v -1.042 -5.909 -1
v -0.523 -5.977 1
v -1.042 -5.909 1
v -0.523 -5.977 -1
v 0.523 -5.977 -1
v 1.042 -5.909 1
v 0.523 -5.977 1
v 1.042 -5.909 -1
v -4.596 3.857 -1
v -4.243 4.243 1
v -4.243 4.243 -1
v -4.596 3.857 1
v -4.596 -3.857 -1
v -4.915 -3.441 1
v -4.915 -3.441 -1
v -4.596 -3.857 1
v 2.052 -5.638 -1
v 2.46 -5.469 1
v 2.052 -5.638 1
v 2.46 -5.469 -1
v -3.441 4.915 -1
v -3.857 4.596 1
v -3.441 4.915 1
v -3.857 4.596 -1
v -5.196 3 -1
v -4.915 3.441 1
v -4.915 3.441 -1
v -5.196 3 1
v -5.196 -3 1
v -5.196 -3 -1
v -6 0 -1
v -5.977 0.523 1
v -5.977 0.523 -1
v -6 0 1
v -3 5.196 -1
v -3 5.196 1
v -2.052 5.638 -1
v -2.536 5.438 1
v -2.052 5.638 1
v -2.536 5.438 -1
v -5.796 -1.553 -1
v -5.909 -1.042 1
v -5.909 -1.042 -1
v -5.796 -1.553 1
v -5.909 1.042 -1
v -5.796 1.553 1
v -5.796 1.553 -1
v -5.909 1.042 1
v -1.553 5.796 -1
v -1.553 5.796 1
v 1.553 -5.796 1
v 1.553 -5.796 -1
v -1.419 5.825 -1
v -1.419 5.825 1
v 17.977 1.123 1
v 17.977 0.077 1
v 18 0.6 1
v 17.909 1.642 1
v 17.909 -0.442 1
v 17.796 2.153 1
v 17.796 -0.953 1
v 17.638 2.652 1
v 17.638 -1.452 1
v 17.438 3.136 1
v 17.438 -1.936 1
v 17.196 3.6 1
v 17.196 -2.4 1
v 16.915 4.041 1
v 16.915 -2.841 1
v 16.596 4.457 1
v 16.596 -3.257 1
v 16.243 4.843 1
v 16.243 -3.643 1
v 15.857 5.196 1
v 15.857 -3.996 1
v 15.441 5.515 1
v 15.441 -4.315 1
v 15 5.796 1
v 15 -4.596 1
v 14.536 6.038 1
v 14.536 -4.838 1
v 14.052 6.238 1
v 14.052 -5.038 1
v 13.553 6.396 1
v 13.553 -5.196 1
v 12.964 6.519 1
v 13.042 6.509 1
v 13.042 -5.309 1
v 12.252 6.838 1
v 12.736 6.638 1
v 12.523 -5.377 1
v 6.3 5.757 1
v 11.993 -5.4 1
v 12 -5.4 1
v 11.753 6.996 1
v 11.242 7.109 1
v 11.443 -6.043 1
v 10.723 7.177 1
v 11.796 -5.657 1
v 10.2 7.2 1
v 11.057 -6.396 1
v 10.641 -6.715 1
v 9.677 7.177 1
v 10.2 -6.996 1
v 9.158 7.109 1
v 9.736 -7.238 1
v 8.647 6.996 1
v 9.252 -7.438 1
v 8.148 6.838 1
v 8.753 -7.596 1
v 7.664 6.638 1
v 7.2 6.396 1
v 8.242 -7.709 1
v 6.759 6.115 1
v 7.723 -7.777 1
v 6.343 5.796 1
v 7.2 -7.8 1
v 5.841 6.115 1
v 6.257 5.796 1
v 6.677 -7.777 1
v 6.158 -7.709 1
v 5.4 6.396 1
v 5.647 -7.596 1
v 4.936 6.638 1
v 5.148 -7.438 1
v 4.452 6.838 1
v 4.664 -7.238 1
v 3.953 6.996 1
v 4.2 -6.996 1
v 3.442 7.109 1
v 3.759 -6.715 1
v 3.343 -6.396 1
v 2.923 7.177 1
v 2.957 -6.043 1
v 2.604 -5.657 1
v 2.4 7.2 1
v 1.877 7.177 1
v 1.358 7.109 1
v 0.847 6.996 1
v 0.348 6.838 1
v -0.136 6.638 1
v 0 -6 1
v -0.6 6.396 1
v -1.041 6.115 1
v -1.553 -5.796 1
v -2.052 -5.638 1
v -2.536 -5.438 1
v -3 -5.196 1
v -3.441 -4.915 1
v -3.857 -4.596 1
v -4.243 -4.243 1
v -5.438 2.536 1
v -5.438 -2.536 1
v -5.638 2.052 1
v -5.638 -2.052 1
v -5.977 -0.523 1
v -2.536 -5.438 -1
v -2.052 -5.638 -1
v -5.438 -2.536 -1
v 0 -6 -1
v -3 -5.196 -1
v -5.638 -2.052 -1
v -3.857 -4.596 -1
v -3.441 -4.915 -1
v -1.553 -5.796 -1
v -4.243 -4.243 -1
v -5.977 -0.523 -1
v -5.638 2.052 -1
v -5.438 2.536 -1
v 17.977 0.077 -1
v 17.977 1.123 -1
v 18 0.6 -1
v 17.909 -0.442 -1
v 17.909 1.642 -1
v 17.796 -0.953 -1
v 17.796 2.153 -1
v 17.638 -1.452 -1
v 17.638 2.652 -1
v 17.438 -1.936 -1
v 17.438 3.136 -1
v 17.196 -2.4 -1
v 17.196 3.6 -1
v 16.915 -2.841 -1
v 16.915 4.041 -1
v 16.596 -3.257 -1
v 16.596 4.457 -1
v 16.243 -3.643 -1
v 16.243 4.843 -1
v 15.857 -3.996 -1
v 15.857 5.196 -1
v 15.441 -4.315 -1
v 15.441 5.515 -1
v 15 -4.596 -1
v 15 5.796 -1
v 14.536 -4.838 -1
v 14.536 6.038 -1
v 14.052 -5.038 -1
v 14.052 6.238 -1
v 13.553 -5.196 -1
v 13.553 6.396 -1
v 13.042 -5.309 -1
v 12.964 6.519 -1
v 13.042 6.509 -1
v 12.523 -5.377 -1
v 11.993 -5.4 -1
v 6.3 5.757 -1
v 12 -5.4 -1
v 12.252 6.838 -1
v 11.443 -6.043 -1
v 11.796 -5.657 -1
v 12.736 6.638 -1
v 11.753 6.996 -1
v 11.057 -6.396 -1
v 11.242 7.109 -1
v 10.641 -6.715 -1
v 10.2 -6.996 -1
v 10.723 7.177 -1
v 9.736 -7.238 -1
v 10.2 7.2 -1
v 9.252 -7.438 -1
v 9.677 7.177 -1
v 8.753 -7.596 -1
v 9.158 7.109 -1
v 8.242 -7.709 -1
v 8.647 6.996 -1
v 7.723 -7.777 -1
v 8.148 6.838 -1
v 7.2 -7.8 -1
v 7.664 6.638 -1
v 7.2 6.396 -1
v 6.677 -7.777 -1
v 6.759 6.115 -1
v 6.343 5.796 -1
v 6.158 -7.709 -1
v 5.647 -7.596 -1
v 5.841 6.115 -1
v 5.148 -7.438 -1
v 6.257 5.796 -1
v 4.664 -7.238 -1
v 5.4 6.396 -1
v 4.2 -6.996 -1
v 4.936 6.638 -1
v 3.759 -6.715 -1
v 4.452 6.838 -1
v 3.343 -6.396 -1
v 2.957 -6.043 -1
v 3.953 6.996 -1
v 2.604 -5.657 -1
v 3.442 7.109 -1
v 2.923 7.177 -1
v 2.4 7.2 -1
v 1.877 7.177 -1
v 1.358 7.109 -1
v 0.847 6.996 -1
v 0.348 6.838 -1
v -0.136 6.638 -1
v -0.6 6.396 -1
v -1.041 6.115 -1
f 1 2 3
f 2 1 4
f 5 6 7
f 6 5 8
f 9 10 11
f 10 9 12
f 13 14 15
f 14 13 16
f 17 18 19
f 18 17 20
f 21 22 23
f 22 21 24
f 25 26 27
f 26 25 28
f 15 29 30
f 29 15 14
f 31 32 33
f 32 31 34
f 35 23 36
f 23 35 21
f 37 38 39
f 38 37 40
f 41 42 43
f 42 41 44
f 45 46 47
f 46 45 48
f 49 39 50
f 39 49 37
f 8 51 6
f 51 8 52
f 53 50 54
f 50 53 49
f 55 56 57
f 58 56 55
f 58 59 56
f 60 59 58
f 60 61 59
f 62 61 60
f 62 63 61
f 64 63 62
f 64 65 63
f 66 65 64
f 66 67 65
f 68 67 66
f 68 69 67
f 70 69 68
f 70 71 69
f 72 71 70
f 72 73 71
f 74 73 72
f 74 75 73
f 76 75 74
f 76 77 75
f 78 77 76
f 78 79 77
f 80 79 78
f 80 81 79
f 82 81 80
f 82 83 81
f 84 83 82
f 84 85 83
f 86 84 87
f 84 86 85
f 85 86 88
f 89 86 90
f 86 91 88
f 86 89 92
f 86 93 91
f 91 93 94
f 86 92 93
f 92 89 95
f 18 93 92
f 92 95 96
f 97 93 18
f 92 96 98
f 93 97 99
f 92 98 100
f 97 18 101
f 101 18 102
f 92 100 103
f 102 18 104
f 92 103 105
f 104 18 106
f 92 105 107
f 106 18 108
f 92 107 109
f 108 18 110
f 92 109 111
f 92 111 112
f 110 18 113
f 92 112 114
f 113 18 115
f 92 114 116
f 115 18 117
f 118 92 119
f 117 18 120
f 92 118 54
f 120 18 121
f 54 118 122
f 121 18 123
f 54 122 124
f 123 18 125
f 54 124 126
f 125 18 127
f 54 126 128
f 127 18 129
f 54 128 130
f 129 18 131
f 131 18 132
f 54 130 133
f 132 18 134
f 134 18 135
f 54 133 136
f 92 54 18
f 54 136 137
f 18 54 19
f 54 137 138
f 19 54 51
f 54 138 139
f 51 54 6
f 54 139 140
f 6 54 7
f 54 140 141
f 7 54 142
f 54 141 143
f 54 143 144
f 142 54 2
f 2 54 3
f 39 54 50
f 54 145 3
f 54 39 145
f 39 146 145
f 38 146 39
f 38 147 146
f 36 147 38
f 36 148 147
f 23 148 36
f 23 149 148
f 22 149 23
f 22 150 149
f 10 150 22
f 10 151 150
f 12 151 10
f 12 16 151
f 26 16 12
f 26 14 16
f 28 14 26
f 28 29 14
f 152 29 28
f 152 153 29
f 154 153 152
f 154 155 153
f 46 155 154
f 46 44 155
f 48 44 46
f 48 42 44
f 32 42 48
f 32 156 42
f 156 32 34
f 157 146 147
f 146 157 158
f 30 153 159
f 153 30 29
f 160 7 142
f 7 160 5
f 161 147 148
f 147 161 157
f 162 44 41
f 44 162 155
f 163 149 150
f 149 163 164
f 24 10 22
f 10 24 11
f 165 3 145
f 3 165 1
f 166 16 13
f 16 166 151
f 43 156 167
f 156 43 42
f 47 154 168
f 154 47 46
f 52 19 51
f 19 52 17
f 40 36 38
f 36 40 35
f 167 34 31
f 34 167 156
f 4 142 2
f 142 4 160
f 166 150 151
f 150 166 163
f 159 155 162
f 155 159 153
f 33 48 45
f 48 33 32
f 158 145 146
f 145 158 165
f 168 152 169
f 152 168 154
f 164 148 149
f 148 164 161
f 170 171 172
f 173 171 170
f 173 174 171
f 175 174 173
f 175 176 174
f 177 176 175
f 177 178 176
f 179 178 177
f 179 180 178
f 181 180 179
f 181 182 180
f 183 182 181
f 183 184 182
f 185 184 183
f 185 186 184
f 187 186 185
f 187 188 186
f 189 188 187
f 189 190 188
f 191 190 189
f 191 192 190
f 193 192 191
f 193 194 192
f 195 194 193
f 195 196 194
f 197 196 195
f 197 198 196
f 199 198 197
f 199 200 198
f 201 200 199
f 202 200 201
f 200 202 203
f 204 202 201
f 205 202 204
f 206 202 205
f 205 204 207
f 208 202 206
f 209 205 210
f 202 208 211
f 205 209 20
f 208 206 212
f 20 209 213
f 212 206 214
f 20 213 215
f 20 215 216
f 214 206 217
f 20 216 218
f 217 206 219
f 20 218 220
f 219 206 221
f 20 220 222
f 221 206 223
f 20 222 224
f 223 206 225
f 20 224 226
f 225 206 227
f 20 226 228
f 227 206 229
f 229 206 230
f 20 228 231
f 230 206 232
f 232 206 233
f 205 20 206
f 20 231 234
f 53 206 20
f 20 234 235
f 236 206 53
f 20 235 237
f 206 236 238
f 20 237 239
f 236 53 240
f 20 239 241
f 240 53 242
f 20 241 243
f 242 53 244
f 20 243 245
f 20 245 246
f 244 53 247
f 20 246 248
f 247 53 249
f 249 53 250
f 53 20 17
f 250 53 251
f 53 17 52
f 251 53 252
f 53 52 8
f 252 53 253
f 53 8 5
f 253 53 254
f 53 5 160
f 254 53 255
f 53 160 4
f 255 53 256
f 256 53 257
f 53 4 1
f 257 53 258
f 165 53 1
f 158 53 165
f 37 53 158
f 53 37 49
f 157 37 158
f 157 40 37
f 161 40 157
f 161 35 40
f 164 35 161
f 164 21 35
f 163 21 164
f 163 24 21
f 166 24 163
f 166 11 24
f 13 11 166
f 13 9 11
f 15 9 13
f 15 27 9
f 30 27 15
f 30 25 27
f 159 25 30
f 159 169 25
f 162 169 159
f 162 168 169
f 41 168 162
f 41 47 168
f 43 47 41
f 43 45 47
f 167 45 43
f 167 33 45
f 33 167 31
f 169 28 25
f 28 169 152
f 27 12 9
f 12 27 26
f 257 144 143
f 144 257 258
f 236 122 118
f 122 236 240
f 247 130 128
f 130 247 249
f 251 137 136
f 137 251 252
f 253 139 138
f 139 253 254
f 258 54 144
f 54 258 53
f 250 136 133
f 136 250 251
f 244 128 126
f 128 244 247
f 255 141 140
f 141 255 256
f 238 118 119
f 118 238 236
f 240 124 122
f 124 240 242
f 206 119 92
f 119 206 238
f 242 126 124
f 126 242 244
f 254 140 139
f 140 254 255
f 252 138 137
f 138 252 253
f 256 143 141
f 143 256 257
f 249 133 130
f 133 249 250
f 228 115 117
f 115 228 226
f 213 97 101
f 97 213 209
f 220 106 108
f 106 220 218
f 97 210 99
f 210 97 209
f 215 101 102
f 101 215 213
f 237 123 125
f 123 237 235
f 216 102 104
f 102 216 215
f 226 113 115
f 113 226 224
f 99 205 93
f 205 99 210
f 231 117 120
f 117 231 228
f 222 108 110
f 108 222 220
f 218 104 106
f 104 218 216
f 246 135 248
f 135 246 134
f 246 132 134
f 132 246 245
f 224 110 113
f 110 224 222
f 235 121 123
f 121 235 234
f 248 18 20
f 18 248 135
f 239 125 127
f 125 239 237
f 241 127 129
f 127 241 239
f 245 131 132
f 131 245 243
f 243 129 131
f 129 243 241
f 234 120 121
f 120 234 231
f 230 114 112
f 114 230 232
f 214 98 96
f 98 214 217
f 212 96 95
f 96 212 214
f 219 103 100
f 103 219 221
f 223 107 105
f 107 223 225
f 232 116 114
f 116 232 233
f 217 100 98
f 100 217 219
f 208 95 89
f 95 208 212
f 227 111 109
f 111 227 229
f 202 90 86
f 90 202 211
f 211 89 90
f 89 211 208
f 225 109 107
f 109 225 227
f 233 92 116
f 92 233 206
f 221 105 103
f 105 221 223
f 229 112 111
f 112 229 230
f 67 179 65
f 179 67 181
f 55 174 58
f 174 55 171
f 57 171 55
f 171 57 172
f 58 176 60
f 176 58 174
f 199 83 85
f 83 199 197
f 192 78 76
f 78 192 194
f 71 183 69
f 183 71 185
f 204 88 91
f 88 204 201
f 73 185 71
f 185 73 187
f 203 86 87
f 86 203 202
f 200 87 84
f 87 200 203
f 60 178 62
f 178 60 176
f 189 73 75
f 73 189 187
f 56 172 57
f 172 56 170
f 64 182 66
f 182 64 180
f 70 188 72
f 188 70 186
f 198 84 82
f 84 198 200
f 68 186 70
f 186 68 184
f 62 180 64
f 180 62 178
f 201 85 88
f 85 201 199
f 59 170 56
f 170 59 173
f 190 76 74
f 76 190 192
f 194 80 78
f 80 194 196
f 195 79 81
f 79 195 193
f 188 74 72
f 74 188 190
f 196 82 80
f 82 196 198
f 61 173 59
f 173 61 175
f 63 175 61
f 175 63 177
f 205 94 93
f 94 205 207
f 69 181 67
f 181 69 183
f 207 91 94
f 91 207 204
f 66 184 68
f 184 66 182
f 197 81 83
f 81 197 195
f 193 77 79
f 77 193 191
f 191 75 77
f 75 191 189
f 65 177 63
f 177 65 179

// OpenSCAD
$fn=72;

D=2;

scale([0.6, 0.6, 1])
{
    translate([0, 0, 0]) cylinder(D, 10, 10, true);
    translate([4, 2, 0]) cylinder(D, 10, 10, true);
    translate([12, -3, 0]) cylinder(D, 10, 10, true);
    translate([17, 2, 0]) cylinder(D, 10, 10, true);
    translate([20, 1, 0]) cylinder(D, 10, 10, true);
}
